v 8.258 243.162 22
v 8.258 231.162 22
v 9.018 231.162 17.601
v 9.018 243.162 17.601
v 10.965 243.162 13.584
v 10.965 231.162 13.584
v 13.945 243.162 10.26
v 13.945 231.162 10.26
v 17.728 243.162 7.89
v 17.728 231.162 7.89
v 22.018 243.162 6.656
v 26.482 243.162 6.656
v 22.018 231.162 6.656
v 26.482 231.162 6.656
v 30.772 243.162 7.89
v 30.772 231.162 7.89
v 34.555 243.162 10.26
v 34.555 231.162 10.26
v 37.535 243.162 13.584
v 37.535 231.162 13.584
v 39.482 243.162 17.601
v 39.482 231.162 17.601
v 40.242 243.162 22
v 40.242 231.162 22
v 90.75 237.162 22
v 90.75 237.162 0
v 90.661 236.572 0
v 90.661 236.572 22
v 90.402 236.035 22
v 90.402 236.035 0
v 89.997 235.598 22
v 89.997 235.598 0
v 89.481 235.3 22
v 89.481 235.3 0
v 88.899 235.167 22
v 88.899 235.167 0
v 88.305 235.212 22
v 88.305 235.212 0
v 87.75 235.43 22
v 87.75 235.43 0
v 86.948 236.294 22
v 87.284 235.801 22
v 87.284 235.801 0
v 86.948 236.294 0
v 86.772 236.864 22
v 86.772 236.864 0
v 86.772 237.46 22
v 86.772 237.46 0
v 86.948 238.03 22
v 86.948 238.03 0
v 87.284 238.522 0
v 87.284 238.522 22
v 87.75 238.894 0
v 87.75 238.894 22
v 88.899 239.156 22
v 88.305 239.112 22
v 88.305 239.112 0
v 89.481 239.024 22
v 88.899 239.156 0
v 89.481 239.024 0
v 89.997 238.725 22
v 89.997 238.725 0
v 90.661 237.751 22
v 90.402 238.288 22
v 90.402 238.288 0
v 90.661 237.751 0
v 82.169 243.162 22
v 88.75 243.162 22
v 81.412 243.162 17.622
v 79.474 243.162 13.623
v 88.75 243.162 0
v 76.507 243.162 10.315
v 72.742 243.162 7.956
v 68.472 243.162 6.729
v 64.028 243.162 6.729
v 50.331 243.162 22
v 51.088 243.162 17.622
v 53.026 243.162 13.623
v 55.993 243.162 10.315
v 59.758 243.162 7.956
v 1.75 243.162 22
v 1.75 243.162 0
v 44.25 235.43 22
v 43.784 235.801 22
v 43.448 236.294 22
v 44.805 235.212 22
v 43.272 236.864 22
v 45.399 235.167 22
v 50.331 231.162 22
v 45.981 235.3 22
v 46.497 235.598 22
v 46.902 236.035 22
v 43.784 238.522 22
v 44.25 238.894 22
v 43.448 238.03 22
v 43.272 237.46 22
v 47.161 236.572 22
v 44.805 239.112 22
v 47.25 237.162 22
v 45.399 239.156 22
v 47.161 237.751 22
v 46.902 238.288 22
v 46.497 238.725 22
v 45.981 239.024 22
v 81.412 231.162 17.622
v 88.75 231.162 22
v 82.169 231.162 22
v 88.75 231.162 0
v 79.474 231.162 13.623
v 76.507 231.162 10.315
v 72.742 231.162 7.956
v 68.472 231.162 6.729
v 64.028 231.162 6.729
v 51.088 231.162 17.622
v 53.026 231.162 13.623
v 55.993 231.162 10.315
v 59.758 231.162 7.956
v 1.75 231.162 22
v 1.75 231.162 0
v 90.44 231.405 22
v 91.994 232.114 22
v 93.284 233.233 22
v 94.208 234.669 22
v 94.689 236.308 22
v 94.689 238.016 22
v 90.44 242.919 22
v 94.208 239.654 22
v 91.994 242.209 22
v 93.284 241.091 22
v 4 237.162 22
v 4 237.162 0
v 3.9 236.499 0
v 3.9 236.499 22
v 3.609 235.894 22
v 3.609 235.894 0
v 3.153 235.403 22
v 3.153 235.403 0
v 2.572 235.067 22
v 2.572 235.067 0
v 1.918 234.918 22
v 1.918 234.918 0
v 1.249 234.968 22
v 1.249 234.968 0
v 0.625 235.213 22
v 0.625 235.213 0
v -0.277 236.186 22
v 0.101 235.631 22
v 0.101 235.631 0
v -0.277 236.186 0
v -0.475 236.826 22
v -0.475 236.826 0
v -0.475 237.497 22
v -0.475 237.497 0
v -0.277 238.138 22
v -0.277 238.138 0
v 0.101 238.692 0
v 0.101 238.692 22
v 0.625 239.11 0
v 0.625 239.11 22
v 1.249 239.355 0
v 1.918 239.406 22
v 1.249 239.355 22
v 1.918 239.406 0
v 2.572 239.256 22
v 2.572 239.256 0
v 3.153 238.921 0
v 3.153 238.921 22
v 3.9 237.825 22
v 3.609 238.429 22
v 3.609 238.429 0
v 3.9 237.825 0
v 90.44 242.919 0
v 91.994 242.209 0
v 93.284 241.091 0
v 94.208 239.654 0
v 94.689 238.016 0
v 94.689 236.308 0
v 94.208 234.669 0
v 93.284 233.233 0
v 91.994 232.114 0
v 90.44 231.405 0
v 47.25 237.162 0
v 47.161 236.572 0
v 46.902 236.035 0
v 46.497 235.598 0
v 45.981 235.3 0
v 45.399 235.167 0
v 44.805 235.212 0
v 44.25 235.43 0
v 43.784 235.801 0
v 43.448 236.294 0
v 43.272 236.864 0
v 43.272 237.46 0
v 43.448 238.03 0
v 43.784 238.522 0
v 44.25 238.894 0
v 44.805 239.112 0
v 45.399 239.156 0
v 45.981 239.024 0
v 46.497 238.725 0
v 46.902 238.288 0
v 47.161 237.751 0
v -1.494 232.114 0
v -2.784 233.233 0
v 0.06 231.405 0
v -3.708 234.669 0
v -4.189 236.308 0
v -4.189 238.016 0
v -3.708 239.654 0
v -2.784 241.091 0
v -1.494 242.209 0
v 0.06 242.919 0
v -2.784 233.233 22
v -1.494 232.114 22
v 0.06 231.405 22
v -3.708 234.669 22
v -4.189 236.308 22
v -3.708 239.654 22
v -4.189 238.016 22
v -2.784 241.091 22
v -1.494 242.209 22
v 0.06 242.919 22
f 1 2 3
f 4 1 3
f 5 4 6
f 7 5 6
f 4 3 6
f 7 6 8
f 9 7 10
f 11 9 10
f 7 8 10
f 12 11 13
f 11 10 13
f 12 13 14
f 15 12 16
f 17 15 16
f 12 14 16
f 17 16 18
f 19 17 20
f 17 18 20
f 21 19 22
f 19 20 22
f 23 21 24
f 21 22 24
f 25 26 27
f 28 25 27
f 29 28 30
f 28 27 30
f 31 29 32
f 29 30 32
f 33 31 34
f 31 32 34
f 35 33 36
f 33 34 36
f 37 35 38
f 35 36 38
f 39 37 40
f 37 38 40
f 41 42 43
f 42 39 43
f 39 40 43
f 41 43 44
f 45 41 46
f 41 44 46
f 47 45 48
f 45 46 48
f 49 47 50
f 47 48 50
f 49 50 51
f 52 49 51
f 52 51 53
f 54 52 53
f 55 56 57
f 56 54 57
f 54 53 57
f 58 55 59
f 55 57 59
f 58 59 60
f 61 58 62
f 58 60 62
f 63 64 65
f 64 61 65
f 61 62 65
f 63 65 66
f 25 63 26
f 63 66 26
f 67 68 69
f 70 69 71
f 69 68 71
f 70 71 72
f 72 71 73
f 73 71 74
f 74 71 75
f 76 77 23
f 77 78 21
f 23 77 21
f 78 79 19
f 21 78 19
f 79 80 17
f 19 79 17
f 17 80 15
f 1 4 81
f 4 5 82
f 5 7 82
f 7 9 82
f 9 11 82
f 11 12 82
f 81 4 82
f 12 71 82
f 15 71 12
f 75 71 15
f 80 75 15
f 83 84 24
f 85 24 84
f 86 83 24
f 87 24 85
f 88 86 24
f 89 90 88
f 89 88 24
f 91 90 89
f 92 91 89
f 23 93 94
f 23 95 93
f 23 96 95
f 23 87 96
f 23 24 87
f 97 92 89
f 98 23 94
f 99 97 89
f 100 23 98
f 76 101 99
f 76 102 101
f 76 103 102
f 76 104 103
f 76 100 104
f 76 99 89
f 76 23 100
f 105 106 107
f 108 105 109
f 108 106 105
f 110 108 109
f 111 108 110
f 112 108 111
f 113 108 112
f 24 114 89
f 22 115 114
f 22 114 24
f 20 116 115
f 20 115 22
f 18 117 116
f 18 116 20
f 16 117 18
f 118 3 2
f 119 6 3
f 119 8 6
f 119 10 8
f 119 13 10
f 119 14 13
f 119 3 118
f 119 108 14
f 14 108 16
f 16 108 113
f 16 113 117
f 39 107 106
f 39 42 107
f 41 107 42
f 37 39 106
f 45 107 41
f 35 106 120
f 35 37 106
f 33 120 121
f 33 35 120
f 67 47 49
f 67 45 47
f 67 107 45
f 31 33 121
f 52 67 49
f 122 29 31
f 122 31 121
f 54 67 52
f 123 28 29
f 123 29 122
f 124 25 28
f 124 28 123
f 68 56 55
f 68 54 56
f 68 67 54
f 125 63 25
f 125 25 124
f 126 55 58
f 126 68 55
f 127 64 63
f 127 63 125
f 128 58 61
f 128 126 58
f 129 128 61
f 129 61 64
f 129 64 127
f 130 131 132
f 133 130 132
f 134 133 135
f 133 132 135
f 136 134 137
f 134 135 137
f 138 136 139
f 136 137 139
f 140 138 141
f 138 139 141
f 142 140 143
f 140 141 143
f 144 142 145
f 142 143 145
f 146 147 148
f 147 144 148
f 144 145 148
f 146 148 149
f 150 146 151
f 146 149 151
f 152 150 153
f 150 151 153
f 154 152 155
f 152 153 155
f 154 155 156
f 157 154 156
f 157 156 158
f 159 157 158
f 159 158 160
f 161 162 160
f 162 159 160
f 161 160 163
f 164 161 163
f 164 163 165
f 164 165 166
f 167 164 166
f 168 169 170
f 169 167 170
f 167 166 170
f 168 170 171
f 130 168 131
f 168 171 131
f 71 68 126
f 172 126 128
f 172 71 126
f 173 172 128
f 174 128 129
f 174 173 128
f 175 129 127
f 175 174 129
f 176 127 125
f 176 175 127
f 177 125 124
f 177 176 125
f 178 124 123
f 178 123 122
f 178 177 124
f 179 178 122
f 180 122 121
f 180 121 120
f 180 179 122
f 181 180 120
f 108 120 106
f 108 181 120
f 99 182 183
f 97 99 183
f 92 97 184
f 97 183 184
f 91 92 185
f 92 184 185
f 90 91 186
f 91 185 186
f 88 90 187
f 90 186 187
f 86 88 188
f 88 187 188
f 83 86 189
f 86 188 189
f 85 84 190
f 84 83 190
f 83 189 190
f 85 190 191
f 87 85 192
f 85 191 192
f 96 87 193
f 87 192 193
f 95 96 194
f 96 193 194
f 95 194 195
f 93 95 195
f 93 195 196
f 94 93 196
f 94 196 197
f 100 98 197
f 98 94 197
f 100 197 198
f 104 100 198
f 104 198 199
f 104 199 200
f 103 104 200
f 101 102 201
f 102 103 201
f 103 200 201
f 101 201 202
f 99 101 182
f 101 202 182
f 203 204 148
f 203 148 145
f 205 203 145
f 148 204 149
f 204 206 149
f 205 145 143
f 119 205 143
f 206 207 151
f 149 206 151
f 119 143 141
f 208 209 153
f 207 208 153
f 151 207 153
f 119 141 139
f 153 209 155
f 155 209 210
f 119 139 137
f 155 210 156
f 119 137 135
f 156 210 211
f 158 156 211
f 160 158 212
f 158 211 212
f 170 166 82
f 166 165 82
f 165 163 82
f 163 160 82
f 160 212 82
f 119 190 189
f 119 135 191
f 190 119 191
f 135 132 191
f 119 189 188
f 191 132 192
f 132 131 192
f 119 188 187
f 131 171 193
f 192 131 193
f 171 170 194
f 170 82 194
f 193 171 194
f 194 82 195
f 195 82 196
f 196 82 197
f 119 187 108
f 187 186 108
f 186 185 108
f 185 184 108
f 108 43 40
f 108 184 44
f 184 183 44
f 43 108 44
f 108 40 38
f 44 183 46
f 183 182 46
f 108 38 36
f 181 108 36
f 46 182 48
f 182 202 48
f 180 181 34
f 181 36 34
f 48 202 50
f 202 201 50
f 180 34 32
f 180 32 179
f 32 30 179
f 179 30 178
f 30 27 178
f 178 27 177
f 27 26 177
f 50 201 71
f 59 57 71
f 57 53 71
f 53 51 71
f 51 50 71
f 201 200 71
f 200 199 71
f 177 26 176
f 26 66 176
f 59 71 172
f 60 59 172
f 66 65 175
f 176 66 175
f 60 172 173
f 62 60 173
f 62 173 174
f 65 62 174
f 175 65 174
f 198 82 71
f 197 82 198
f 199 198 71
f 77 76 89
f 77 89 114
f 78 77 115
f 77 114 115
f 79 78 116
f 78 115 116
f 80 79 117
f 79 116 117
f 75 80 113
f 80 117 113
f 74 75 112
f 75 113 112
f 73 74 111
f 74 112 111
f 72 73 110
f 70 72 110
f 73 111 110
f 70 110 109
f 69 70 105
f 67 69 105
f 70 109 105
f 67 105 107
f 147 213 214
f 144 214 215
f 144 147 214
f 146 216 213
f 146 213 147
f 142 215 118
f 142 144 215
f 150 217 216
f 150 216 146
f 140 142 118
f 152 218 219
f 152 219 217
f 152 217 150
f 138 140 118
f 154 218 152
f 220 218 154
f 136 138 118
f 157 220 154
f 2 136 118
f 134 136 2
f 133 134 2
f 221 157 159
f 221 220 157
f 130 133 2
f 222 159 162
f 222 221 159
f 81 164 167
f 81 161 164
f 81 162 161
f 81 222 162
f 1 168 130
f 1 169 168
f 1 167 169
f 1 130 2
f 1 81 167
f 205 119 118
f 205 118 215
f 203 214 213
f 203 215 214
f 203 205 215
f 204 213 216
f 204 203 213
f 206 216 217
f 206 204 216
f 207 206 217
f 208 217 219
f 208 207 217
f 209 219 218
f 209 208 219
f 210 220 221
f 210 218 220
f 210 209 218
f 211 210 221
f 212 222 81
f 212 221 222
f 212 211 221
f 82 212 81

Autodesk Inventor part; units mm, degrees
ref_plane "YZ Plane" through (0, 0, 0) normal (1, 0, 0) x (0, 1, 0)
ref_plane "XZ Plane" through (0, 0, 0) normal (0, 1, 0) x (-1, 0, 0)
ref_plane "XY Plane" through (0, 0, 0) normal (0, 0, 1) x (1, 0, 0)
sketch "Szkic1" plane through (0, 0, 0) normal (0, 0, 1) x (1, 0, 0)
  arc A0 (85.75, 216.779101) -> (95.75, 226.779101) centre (85.75, 226.779101) ccw
  line L0 (85.75, 216.779101) -> (83.25, 216.779101)
  arc A1 (83.25, 216.779101) -> (53.25, 186.779101) centre (83.25, 186.779101) ccw
  line L1 (53.25, 186.779101) -> (53.25, -39)
  arc A2 (46.25, -46) -> (53.25, -39) centre (46.25, -39) ccw
  line L2 (-1.25, -46) -> (46.25, -46)
  arc A3 (-8.916667, 45.356612) -> (-1.25, -46) centre (-1.25, 0) ccw
  arc A4 (-8.916667, 45.356612) -> (-7.25, 47.328638) centre (-9.25, 47.328638) ccw
  line L3 (-7.25, 400) -> (-7.25, 47.328638)
  arc A5 (27.038691, 446) -> (-7.25, 400) centre (40.75, 400) ccw
  line L4 (85.75, 446) -> (27.038691, 446)
  arc A6 (95.75, 436) -> (85.75, 446) centre (85.75, 436) ccw
  line L5 (95.75, 226.779101) -> (95.75, 436)
  circle A7 centre (46.75, 361.06) radius 2
  circle A8 centre (40.75, 400) radius 23.333333
  circle A9 centre (85.75, 438.7) radius 2
  circle A10 centre (85.75, 361.06) radius 2
  circle A11 centre (46.75, 438.7) radius 2
  circle A12 centre (-10.958284, -29.879026) radius 2.1
  circle A13 centre (-32.666667, 0) radius 2.1
  circle A14 centre (24.166617, -18.466253) radius 2.1
  circle A15 centre (-10.958284, 29.879026) radius 2.1
  circle A16 centre (24.166617, 18.466253) radius 2.1
  circle A17 centre (-1.25, 0) radius 23.333333
  circle A18 centre (1.75, 302.77336) radius 2.25
  circle A19 centre (1.75, 237.161813) radius 2.25
  circle A20 centre (43.75, 127.673594) radius 2
  circle A21 centre (4.75, -38.7) radius 2
  circle A22 centre (4.75, 38.94) radius 2
  circle A23 centre (4.75, 127.673594) radius 2
  circle A24 centre (43.75, -38.7) radius 2
  circle A25 centre (43.75, 38.94) radius 2
  circle A26 centre (45.25, 237.161813) radius 2
  circle A27 centre (88.75, 302.77336) radius 2
  circle A28 centre (45.25, 302.77336) radius 2
  circle A29 centre (88.75, 237.161813) radius 2
  circle A30 centre (66.166617, 381.533747) radius 2.1
  circle A31 centre (66.166617, 418.466253) radius 2.1
  circle A32 centre (31.041716, 370.120974) radius 2.1
  circle A33 centre (31.041716, 429.879026) radius 2.1
  circle A34 centre (9.333333, 400) radius 2.1
  circle A35 centre (88.75, 237.161813) radius 6
  circle A36 centre (1.75, 237.161813) radius 6
  line L6 (88.75, 231.161813) -> (1.75, 231.161813)
  line L7 (88.75, 243.161813) -> (1.75, 243.161813)
  point P0 (0, 0)
  dimension "d0" = 12
  dimension "d1" = 12
extrude "Wyciągnięcie proste1" add sketch "Szkic1" along normal blind 22 contours A35 | A35 L6 A36 L7 | A36
sketch "Szkic2" plane through (1.75, 231.161813, 0) normal (0, -1, 0) x (1, 0, 0)
  circle A0 centre (64.5, 22.5) radius 16
  circle A1 centre (64.5, 22.5) radius 15.927206
  circle A2 centre (22.5, 22.5) radius 16
  circle A3 centre (64.5, 22.5) radius 16
  point P0 (-1.75, 0)
sketch "Szkic2 outline for Wyciągnięcie proste2" plane through (1.75, 231.161813, 0) normal (0, -1, 0) x (1, 0, 0)
  circle A0 centre (22.5, 22.5) radius 16
  circle A1 centre (64.5, 22.5) radius 15.927206
extrude "Wyciągnięcie proste2" cut sketch "Szkic2 outline for Wyciągnięcie proste2" against normal through all
properties part number "uchwyt_na_silniki_v2"
